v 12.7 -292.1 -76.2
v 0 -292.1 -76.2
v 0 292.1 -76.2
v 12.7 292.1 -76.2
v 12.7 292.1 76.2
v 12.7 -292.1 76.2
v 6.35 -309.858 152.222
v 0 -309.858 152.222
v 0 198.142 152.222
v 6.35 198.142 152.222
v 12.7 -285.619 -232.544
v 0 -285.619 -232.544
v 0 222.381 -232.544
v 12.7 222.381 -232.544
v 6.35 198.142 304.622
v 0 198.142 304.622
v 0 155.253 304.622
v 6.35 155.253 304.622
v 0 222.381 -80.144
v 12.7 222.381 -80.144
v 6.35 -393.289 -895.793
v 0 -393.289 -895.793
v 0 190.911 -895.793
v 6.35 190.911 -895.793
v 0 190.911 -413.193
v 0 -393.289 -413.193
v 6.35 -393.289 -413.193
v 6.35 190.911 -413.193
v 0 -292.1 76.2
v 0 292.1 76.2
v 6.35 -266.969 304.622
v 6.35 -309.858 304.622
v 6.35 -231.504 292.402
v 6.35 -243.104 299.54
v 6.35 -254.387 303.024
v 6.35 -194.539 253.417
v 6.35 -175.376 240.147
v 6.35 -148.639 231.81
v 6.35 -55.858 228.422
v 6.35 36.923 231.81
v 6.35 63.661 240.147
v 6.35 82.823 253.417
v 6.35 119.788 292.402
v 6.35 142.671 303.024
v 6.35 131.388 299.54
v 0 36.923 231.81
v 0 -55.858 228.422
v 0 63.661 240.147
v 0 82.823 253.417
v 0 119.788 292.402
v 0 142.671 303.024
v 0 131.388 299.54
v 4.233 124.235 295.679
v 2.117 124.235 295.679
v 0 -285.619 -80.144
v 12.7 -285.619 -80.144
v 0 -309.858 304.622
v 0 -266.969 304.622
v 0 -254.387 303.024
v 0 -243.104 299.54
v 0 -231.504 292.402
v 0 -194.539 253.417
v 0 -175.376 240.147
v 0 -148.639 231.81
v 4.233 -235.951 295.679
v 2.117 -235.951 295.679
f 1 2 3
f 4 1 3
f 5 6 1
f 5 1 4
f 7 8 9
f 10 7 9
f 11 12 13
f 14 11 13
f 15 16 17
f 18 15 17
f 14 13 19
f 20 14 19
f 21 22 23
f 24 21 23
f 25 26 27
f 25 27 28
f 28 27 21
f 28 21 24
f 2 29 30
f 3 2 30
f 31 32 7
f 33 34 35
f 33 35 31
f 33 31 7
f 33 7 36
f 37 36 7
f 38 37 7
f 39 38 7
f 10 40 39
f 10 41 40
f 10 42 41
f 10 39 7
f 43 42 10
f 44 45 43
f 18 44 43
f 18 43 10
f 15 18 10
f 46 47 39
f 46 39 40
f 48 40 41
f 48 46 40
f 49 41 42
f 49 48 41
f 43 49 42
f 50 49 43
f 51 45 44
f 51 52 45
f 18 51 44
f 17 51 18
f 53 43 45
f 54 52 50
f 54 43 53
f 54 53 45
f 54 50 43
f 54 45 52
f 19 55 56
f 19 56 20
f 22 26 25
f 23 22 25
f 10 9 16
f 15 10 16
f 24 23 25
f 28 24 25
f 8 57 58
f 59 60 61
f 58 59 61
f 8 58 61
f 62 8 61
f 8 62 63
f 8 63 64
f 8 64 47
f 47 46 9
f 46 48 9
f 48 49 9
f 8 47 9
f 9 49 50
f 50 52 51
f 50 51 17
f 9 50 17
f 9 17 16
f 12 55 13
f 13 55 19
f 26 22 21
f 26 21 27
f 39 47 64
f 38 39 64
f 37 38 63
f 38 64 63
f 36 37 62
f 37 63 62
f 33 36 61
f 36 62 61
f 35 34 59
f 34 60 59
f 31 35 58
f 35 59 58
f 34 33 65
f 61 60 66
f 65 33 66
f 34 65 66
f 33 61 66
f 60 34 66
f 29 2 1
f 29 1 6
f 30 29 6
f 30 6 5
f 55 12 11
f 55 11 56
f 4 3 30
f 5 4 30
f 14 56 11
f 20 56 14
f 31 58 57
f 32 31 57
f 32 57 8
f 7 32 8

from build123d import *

# Parameters (mm, degrees)
F0_W     = 584.2
F0_H     = 152.4
F1_DEPTH = 12.7
F2_W     = 508
F2_H     = 152.4
F3_DEPTH = 12.7
F4_W     = 584.2
F4_H     = 482.6
F5_DEPTH = 6.35
F7_DEPTH = 6.35


with BuildPart() as f1:
    # F0 (on Right) → F1 (new body)
    with BuildSketch(Plane.YZ):
        Rectangle(F0_W, F0_H)
    extrude(amount=F1_DEPTH)


with BuildPart() as f3:
    # F2 (on Right) → F3 (new body)
    with BuildSketch(Plane.YZ):
        with Locations((-31.6194959879, -156.34352808)):
            Rectangle(F2_W, F2_H)
    extrude(amount=F3_DEPTH)


with BuildPart() as f5:
    # F4 (on Right) → F5 (new body)
    with BuildSketch(Plane.YZ):
        with Locations((-101.1885877609, -654.4928419113)):
            Rectangle(F4_W, F4_H)
    extrude(amount=F5_DEPTH)


with BuildPart() as f7:
    # F6 (on Right) → F7 (new body)
    with BuildSketch(Plane.YZ):
        with BuildLine():
            Line((-309.8578155041, 304.6216200829), (-309.8578155041, 152.2216200829))
            Line((-309.8578155041, 152.2216200829), (198.1421844959, 152.2216200829))
            Line((198.1421844959, 152.2216200829), (198.1421844959, 304.6216200829))
            Line((198.1421844959, 304.6216200829), (155.2530093381, 304.6216200829))
            add(Edge.make_bspline(
                [(-55.8578155041, 228.4216200829), (-16.1413426703, 228.9934551226), (75.0673796799, 220.49521215), (112.0596419763, 296.8255057536), (143.3211881258, 303.8389214173), (155.2530093381, 304.6216200829)],
                knots=[0, 0, 0, 0, 0.3873995373, 0.6985011211, 0.8476284984, 0.8476284984, 0.8476284984, 0.8476284984], degree=3))
            add(Edge.make_bspline(
                [(-55.8578155041, 228.4216200829), (-95.5742883379, 228.9934551226), (-186.783010688, 220.49521215), (-223.7752729844, 296.8255057536), (-255.0368191339, 303.8389214173), (-266.9686403462, 304.6216200829)],
                knots=[0, 0, 0, 0, 0.3873995373, 0.6985011211, 0.8476284984, 0.8476284984, 0.8476284984, 0.8476284984], degree=3))
            Line((-266.9686403462, 304.6216200829), (-309.8578155041, 304.6216200829))
        make_face()
    extrude(amount=F7_DEPTH)


solid = Compound([f1.part, f3.part, f5.part, f7.part])
